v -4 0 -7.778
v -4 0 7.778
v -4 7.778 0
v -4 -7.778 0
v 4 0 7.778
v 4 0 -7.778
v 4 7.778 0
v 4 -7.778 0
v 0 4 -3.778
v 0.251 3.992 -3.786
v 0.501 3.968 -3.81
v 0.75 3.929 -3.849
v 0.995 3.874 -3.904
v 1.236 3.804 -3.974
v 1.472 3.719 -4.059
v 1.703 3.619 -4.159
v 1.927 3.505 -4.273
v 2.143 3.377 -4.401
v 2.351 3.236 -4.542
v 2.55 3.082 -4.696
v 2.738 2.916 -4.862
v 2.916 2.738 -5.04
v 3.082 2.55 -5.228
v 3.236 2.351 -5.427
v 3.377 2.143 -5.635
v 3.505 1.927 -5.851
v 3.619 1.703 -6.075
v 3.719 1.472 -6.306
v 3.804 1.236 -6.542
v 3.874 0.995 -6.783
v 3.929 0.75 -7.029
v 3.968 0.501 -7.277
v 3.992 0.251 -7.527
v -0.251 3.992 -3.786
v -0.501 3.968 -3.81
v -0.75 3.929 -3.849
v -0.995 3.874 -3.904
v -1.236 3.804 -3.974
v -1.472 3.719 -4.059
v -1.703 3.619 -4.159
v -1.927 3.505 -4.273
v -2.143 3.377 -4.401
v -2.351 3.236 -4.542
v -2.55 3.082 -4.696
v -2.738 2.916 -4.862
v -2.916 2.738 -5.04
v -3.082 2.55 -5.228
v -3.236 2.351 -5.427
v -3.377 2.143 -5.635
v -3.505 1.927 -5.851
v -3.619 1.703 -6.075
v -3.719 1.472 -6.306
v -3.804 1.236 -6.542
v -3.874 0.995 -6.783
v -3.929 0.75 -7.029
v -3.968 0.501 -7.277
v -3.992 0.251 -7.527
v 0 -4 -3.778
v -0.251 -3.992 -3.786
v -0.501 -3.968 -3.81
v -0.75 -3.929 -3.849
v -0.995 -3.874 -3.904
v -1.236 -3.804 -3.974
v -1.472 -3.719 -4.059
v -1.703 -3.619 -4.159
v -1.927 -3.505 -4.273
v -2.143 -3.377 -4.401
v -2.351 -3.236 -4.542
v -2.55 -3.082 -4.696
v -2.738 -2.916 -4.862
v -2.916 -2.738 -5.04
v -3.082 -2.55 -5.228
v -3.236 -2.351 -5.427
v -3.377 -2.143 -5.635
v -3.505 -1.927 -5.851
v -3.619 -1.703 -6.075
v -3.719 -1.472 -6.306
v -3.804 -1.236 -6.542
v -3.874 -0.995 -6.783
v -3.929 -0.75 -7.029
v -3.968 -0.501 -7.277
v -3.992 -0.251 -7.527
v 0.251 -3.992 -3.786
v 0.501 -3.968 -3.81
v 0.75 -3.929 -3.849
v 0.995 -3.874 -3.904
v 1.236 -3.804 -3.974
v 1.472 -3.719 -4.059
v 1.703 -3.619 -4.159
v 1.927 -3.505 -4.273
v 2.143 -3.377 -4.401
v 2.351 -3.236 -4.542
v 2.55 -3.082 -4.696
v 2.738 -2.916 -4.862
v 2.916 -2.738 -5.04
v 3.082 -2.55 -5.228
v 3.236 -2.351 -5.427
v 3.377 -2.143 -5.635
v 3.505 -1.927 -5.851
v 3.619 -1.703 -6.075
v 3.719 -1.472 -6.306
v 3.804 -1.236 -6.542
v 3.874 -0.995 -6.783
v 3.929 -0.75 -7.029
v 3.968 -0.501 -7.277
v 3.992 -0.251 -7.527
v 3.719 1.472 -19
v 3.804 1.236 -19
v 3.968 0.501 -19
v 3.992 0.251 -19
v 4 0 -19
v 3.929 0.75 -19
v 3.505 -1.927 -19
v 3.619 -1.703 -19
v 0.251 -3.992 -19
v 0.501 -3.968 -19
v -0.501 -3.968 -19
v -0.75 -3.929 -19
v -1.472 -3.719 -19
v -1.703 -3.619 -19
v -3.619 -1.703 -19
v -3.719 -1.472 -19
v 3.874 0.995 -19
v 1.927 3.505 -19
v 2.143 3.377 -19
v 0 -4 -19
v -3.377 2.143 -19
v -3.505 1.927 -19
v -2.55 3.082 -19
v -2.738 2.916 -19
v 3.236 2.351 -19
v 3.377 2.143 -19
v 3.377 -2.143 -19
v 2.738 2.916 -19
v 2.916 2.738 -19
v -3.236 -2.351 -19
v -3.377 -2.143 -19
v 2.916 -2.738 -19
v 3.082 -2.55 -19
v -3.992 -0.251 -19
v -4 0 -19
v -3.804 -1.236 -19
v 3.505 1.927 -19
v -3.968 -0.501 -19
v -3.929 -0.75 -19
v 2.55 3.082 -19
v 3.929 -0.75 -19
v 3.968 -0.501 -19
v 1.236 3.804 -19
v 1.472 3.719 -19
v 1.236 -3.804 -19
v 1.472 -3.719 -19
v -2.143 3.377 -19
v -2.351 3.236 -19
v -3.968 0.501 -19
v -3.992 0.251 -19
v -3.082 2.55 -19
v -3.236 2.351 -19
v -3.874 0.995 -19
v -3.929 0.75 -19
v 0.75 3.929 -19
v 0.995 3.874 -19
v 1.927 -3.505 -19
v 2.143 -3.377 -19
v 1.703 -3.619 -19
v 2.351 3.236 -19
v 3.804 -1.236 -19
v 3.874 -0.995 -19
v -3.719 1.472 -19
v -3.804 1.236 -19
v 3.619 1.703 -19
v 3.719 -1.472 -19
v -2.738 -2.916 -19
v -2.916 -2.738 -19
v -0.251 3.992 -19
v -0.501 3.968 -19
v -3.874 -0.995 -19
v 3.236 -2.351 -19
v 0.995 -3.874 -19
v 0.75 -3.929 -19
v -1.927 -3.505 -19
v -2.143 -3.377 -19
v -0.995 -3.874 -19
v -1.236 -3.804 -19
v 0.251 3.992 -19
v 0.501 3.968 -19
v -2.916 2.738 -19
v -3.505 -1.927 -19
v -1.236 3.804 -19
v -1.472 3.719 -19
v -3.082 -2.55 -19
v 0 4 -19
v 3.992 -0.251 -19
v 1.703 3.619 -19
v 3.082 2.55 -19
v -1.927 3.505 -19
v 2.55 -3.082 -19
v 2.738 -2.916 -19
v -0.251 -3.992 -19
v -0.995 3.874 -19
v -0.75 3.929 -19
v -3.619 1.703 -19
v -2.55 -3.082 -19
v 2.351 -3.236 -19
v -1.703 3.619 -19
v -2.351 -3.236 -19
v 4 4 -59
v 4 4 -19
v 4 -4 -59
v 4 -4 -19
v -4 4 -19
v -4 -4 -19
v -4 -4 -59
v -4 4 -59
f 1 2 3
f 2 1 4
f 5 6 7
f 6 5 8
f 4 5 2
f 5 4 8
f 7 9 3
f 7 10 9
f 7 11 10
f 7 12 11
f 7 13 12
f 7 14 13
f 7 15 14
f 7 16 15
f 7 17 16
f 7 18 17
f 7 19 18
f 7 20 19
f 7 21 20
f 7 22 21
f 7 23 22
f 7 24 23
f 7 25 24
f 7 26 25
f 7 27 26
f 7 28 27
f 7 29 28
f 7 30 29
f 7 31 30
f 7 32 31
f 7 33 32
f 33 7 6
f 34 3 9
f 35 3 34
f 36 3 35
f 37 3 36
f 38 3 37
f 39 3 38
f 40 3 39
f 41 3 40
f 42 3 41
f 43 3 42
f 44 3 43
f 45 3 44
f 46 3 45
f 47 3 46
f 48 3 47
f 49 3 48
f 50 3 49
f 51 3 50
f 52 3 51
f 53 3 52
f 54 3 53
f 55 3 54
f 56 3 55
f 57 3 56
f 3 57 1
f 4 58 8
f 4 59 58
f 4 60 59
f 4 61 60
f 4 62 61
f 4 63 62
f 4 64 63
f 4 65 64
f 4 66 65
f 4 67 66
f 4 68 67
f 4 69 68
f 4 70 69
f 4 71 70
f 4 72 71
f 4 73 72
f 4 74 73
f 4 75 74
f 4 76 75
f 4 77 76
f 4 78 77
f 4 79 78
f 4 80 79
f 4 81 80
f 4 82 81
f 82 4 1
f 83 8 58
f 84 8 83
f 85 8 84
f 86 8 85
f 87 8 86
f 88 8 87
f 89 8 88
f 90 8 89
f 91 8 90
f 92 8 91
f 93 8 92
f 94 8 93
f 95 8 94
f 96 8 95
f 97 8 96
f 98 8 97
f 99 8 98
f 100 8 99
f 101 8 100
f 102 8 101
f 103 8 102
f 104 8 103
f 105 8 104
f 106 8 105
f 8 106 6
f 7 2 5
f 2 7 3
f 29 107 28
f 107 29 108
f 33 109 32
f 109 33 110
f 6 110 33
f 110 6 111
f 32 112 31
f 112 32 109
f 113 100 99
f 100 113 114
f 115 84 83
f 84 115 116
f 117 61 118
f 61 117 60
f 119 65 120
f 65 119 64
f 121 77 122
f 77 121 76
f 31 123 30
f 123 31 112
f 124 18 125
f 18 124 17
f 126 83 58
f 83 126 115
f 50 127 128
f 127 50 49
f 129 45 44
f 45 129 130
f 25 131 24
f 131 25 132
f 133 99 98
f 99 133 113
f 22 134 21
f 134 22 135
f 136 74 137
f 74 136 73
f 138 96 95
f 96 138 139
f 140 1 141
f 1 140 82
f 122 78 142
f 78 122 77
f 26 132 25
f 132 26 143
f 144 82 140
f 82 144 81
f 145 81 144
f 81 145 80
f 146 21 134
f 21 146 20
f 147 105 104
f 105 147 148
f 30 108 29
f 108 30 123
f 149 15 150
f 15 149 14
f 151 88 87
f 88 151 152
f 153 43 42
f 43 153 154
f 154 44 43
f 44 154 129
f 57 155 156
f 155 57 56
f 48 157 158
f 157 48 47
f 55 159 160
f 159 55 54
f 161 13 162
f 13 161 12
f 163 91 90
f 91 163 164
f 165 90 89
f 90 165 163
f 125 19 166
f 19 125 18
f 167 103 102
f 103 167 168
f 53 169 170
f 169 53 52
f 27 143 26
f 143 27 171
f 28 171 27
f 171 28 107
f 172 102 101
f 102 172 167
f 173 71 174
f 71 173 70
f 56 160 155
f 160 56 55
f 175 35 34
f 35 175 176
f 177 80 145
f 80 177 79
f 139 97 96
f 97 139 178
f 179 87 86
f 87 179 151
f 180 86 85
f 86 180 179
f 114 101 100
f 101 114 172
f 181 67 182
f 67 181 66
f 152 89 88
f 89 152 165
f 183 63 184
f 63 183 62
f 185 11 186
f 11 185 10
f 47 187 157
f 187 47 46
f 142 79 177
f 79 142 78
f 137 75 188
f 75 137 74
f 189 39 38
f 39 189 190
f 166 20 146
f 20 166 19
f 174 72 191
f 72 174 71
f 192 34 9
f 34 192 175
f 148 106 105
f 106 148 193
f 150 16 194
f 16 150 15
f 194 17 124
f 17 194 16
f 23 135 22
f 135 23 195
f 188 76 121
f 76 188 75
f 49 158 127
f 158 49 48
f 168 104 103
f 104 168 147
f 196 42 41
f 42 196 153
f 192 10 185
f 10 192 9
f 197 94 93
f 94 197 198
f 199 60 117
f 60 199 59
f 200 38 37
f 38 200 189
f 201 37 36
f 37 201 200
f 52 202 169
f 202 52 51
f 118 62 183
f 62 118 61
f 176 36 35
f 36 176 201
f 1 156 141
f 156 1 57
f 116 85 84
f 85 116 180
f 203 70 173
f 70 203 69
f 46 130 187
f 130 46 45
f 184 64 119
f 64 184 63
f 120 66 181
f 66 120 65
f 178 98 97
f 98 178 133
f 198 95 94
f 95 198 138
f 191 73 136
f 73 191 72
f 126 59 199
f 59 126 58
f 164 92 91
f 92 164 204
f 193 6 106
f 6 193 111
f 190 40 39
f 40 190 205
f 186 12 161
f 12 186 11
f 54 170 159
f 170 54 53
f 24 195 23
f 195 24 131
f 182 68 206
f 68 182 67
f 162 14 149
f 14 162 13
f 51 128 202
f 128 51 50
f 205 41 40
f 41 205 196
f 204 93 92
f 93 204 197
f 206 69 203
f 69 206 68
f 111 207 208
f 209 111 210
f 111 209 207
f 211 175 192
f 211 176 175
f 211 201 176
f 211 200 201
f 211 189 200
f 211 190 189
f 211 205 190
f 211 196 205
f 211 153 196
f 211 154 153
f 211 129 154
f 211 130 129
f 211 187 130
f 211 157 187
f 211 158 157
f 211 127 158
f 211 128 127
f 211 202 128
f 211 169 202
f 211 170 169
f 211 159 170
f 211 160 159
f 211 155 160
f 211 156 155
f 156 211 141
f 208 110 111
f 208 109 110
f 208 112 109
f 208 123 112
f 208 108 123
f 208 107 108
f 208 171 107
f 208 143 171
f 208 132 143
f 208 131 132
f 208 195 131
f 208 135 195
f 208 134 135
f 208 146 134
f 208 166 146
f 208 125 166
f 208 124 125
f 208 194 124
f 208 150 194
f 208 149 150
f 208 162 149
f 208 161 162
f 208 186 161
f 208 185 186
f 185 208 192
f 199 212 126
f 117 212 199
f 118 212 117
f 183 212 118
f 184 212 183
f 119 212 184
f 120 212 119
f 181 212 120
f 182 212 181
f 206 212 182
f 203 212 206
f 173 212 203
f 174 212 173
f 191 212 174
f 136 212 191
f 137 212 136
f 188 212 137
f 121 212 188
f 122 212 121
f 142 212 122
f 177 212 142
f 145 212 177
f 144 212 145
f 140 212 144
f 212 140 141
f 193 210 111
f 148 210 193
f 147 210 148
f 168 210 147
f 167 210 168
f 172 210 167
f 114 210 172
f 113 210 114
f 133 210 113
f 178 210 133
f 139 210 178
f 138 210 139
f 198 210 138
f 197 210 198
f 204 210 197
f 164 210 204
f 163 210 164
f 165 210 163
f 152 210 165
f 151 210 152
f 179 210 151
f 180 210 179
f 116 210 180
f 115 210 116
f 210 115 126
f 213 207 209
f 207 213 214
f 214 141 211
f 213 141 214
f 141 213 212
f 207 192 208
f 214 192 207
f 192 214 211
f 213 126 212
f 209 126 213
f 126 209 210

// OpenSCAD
//create shaft
rotate(a=[45,0,0]) {
	cube(size = [8,11,11], center = true);	
}

translate([0,0,-10])
	cylinder(h = 20, r=4, $fn=100, center = true);
	
translate([0,0,-39])
	cube(size = [8,8,40], center = true);
